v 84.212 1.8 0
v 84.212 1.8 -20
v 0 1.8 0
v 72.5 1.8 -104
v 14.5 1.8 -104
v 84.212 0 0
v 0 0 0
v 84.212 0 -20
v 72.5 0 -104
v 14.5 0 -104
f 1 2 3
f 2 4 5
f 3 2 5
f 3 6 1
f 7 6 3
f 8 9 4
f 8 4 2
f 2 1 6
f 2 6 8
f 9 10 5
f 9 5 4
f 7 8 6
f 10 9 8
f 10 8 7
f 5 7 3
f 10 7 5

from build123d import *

# Parameters (mm, degrees)
EXTRUDE_1_DEPTH     = 1.8
SKETCH_2_W          = 2.788461538
SKETCH_2_H          = 20
CUT_EXTRUDE_1_DEPTH = 136.603244799


with BuildPart() as part:
    # 草图1 → 凸台-拉伸1 (new body)
    with BuildSketch(Plane(origin=(0, 0, 0), x_dir=(1, 0, 0), z_dir=(0, 1, 0))):
        Polygon((0, 0), (14.5, 104), (72.5, 104), (87, 0), align=None)
    extrude(amount=EXTRUDE_1_DEPTH)

    # 草图2 → 切除-拉伸1 (cut, through all)
    with BuildSketch(Plane(origin=(0, 1.8, 0), x_dir=(1, 0, 0), z_dir=(0, 1, 0))):
        with Locations((85.605769231, 10)):
            Rectangle(SKETCH_2_W, SKETCH_2_H)
    extrude(amount=-CUT_EXTRUDE_1_DEPTH, mode=Mode.SUBTRACT)


solid = part.part
